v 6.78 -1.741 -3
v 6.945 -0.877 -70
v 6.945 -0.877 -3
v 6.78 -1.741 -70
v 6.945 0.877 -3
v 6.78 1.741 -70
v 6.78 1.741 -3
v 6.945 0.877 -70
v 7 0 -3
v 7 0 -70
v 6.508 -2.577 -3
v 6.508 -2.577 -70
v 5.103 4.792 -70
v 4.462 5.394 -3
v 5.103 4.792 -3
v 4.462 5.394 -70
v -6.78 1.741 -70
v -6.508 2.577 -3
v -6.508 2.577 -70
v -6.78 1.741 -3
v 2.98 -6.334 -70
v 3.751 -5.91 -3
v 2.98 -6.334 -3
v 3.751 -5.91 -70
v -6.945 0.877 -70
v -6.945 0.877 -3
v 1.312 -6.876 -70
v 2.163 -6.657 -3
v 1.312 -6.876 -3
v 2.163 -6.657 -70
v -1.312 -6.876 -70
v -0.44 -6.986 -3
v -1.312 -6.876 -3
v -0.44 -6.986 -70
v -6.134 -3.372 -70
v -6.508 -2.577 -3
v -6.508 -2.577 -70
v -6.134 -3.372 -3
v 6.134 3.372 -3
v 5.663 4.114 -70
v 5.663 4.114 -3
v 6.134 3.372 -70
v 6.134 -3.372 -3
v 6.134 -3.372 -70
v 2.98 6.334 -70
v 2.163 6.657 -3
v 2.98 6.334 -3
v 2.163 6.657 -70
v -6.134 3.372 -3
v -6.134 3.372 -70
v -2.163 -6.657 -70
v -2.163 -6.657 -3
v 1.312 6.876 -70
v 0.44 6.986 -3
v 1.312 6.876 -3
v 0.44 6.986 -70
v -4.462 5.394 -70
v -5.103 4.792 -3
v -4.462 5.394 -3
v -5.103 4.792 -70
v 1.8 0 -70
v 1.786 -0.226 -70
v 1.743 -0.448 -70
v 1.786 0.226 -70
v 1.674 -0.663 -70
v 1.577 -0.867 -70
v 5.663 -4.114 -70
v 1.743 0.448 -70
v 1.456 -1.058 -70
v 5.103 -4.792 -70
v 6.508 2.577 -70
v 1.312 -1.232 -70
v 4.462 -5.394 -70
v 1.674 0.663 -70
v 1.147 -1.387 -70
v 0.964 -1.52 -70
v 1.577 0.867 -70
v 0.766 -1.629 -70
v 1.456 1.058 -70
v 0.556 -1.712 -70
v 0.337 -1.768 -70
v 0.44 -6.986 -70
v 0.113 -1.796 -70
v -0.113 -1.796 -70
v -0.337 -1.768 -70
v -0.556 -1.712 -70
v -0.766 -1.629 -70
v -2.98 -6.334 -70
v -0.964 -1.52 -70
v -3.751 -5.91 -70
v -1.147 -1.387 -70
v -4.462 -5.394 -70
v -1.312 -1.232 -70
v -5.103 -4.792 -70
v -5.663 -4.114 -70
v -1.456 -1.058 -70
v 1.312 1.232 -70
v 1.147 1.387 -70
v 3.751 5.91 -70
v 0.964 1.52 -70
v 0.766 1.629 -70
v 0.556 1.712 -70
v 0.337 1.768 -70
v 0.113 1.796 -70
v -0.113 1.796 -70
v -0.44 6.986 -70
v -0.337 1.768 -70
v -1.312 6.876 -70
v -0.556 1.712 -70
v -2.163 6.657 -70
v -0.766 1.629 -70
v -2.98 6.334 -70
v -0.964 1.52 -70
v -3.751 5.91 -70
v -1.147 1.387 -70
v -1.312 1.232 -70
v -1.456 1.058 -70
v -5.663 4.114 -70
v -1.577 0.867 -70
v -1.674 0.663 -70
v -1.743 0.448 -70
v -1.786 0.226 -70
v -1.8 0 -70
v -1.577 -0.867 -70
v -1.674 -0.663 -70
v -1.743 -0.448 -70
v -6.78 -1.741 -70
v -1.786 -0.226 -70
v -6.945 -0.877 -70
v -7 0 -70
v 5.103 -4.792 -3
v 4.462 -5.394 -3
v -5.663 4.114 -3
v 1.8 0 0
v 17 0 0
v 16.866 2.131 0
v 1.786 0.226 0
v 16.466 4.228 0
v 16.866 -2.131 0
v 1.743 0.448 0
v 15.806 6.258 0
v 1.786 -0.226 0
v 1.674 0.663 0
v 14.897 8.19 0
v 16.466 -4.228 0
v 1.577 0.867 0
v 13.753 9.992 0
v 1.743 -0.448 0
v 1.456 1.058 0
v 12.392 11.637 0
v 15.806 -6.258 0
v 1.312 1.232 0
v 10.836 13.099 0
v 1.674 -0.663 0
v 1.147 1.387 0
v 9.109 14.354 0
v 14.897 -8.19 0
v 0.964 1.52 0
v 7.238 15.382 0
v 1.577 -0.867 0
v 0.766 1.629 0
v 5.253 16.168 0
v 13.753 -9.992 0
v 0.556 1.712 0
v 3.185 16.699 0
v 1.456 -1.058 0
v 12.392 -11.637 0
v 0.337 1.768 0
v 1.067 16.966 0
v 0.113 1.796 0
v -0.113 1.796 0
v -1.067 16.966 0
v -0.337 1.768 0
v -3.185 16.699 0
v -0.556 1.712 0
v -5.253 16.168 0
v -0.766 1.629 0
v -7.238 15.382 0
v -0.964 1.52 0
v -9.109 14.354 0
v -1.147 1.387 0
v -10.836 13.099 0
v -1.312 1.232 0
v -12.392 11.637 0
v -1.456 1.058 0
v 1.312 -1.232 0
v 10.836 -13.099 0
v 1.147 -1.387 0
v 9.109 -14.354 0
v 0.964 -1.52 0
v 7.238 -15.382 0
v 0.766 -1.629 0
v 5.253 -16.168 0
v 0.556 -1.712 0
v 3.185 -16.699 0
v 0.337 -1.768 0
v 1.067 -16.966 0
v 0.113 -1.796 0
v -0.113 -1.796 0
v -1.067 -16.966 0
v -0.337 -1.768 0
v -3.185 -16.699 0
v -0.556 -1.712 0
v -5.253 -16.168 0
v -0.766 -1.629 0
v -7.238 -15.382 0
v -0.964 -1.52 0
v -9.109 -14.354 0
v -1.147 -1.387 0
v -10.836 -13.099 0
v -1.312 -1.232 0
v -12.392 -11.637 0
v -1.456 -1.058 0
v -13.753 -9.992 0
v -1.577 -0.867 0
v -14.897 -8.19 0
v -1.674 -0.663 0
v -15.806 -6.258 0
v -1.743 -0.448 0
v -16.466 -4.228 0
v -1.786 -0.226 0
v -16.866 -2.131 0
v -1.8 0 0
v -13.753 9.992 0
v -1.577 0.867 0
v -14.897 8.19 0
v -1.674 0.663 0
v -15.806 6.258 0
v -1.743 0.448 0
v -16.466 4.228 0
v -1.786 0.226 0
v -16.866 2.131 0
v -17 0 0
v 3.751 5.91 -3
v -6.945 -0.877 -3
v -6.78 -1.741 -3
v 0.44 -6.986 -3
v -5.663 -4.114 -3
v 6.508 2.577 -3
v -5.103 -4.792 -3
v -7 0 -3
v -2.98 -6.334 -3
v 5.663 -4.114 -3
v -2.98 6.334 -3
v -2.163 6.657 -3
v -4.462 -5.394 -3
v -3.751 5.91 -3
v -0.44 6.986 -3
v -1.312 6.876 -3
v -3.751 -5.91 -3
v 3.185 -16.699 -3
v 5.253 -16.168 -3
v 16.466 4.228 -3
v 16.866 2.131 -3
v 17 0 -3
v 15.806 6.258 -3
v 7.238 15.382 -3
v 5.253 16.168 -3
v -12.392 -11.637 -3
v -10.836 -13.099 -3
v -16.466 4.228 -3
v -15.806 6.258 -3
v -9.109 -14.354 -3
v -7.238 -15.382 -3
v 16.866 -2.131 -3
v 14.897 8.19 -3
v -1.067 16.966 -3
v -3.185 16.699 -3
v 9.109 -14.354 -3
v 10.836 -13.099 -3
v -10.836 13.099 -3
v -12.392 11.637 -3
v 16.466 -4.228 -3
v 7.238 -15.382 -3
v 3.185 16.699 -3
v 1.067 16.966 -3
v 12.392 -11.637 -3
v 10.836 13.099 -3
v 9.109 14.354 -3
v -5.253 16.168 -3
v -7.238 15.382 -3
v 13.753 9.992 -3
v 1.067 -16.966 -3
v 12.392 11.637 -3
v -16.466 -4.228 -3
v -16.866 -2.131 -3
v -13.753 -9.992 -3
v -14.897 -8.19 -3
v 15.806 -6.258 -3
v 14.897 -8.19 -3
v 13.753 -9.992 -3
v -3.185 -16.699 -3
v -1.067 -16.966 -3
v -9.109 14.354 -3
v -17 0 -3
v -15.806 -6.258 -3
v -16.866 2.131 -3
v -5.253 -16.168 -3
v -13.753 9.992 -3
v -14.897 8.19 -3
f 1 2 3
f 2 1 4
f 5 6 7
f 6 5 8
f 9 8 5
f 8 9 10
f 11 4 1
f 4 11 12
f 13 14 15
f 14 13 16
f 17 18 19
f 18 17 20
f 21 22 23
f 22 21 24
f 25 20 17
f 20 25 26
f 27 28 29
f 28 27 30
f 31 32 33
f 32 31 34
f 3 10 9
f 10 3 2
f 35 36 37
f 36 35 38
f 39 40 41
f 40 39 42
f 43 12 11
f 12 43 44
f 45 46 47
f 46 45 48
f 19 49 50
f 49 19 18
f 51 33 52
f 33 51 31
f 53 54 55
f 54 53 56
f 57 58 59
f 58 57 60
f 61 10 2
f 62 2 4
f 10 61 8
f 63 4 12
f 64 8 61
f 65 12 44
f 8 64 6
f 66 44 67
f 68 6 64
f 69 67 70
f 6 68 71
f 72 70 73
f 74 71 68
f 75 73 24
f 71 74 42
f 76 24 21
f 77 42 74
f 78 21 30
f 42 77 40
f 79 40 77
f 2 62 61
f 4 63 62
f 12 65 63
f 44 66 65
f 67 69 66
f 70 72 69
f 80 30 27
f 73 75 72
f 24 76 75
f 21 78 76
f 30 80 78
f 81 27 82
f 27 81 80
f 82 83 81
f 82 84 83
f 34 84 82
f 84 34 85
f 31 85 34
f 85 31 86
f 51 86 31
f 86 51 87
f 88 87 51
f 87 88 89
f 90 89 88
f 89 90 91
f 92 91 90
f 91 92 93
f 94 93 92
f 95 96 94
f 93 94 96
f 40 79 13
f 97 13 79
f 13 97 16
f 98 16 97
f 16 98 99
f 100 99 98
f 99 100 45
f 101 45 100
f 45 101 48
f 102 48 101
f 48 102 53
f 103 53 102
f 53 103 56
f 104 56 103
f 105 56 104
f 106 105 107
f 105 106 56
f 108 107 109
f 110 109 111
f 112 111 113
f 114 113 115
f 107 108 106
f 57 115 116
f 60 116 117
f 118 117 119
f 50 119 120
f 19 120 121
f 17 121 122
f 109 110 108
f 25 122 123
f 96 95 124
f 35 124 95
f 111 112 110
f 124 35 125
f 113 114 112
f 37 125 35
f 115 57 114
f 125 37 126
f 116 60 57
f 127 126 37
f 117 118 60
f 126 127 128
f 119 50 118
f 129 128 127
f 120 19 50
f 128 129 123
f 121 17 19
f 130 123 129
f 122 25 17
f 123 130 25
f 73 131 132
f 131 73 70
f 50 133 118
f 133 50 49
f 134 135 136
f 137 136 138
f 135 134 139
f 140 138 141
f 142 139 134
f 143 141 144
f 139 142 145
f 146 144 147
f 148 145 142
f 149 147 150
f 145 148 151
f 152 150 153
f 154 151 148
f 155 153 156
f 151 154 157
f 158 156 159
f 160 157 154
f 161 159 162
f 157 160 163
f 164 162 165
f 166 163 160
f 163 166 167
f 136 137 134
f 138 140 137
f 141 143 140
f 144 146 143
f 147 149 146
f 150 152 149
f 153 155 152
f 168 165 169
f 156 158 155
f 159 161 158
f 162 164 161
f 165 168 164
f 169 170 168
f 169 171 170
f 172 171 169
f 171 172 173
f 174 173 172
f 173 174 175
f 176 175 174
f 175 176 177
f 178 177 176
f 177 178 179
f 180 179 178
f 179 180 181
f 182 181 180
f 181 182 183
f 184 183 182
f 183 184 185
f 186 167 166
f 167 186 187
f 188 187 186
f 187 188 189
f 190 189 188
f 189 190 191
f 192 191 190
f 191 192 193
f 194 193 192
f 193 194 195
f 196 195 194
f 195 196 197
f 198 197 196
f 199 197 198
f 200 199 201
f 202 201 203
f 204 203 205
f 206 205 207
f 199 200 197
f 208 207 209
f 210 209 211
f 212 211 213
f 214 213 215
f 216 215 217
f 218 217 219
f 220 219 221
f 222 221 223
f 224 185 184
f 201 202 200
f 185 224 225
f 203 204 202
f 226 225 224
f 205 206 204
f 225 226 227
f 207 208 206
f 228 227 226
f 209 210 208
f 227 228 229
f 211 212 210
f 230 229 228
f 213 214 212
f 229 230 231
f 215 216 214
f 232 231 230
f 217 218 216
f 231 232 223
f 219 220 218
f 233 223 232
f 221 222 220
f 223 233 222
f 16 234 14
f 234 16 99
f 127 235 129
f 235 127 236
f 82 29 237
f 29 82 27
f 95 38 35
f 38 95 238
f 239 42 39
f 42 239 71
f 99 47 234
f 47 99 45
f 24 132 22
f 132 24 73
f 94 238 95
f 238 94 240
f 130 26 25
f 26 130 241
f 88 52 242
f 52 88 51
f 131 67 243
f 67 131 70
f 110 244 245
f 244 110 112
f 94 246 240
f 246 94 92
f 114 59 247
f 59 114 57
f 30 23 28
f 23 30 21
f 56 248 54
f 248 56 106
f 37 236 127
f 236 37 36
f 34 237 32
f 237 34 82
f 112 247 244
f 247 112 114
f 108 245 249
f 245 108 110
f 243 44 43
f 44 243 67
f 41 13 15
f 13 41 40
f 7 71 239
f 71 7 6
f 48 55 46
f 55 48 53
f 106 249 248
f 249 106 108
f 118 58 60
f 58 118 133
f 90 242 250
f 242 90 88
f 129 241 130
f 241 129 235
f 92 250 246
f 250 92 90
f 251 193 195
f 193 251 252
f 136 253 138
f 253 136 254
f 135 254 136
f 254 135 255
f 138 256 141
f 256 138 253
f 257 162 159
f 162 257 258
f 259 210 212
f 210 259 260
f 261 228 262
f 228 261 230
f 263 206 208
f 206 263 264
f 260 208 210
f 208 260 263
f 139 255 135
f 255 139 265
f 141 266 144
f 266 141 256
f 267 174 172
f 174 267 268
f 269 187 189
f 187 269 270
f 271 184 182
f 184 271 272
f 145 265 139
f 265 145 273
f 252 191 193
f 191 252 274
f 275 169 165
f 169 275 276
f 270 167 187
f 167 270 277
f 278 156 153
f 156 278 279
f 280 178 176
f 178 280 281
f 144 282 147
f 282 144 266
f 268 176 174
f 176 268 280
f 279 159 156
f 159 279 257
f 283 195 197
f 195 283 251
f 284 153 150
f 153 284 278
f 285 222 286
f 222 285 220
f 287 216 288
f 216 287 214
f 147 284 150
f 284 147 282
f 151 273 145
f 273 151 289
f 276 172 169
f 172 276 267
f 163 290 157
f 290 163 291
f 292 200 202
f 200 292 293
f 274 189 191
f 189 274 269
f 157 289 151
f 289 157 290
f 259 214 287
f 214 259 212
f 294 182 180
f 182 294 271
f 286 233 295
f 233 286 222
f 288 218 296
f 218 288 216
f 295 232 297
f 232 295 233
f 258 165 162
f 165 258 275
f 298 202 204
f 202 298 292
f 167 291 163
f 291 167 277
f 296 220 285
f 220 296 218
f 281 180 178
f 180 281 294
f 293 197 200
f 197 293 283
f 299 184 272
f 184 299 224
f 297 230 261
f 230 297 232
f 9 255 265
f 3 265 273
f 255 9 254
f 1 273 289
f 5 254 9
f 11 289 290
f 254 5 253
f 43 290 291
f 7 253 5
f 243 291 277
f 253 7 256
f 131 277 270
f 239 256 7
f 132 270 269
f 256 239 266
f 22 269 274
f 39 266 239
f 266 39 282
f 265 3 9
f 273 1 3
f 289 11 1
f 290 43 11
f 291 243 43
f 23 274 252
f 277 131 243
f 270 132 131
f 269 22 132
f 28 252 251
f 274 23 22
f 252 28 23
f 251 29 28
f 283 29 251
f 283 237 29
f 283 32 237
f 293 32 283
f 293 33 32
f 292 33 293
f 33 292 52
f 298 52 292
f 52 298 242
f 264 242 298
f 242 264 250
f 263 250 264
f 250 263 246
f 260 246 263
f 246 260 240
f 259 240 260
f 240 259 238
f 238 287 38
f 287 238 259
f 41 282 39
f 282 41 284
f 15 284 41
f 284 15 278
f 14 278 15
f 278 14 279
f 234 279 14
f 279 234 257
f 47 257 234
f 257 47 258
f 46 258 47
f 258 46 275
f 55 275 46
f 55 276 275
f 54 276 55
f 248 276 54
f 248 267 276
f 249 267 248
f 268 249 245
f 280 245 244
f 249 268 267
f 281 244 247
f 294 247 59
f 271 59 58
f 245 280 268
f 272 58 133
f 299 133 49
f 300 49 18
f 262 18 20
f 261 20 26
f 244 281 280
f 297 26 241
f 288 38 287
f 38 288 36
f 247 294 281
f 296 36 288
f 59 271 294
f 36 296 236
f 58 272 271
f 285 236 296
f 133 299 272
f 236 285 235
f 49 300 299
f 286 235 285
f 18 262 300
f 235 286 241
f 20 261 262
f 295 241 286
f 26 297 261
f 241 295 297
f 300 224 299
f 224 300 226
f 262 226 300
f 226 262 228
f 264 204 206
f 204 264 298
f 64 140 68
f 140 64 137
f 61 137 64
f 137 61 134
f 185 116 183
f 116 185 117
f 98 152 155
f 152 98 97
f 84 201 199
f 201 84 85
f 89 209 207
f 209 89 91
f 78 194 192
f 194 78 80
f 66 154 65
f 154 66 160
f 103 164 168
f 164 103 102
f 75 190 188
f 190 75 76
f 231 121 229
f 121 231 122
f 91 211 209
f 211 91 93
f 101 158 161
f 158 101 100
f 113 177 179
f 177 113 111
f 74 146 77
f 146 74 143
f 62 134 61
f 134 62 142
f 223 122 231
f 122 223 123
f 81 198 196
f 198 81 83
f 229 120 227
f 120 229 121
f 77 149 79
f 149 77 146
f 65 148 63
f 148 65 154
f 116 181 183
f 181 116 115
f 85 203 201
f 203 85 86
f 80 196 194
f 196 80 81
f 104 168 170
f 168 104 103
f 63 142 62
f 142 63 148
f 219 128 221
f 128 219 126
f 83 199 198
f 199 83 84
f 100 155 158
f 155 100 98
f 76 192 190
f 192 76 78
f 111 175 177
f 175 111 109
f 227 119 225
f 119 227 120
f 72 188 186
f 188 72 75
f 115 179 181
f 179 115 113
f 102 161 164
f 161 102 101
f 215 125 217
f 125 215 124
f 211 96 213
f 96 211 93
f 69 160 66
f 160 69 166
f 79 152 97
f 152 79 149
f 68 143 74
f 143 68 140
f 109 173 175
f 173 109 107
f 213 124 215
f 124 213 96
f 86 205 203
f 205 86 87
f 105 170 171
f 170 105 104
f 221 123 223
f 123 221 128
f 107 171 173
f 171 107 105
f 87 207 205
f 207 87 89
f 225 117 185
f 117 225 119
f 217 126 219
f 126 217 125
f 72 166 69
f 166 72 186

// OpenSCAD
$fn = 50;


difference() {
	union() {
		translate(v = [0, 0, -70.0000000000]) {
			cylinder(h = 70, r = 7.0000000000);
		}
		translate(v = [0, 0, -3.0000000000]) {
			cylinder(h = 3, r = 17.0000000000);
		}
	}
	union() {
		#translate(v = [0, 0, -70]) {
			cylinder(h = 70, r = 1.8000000000);
		}
	}
}
